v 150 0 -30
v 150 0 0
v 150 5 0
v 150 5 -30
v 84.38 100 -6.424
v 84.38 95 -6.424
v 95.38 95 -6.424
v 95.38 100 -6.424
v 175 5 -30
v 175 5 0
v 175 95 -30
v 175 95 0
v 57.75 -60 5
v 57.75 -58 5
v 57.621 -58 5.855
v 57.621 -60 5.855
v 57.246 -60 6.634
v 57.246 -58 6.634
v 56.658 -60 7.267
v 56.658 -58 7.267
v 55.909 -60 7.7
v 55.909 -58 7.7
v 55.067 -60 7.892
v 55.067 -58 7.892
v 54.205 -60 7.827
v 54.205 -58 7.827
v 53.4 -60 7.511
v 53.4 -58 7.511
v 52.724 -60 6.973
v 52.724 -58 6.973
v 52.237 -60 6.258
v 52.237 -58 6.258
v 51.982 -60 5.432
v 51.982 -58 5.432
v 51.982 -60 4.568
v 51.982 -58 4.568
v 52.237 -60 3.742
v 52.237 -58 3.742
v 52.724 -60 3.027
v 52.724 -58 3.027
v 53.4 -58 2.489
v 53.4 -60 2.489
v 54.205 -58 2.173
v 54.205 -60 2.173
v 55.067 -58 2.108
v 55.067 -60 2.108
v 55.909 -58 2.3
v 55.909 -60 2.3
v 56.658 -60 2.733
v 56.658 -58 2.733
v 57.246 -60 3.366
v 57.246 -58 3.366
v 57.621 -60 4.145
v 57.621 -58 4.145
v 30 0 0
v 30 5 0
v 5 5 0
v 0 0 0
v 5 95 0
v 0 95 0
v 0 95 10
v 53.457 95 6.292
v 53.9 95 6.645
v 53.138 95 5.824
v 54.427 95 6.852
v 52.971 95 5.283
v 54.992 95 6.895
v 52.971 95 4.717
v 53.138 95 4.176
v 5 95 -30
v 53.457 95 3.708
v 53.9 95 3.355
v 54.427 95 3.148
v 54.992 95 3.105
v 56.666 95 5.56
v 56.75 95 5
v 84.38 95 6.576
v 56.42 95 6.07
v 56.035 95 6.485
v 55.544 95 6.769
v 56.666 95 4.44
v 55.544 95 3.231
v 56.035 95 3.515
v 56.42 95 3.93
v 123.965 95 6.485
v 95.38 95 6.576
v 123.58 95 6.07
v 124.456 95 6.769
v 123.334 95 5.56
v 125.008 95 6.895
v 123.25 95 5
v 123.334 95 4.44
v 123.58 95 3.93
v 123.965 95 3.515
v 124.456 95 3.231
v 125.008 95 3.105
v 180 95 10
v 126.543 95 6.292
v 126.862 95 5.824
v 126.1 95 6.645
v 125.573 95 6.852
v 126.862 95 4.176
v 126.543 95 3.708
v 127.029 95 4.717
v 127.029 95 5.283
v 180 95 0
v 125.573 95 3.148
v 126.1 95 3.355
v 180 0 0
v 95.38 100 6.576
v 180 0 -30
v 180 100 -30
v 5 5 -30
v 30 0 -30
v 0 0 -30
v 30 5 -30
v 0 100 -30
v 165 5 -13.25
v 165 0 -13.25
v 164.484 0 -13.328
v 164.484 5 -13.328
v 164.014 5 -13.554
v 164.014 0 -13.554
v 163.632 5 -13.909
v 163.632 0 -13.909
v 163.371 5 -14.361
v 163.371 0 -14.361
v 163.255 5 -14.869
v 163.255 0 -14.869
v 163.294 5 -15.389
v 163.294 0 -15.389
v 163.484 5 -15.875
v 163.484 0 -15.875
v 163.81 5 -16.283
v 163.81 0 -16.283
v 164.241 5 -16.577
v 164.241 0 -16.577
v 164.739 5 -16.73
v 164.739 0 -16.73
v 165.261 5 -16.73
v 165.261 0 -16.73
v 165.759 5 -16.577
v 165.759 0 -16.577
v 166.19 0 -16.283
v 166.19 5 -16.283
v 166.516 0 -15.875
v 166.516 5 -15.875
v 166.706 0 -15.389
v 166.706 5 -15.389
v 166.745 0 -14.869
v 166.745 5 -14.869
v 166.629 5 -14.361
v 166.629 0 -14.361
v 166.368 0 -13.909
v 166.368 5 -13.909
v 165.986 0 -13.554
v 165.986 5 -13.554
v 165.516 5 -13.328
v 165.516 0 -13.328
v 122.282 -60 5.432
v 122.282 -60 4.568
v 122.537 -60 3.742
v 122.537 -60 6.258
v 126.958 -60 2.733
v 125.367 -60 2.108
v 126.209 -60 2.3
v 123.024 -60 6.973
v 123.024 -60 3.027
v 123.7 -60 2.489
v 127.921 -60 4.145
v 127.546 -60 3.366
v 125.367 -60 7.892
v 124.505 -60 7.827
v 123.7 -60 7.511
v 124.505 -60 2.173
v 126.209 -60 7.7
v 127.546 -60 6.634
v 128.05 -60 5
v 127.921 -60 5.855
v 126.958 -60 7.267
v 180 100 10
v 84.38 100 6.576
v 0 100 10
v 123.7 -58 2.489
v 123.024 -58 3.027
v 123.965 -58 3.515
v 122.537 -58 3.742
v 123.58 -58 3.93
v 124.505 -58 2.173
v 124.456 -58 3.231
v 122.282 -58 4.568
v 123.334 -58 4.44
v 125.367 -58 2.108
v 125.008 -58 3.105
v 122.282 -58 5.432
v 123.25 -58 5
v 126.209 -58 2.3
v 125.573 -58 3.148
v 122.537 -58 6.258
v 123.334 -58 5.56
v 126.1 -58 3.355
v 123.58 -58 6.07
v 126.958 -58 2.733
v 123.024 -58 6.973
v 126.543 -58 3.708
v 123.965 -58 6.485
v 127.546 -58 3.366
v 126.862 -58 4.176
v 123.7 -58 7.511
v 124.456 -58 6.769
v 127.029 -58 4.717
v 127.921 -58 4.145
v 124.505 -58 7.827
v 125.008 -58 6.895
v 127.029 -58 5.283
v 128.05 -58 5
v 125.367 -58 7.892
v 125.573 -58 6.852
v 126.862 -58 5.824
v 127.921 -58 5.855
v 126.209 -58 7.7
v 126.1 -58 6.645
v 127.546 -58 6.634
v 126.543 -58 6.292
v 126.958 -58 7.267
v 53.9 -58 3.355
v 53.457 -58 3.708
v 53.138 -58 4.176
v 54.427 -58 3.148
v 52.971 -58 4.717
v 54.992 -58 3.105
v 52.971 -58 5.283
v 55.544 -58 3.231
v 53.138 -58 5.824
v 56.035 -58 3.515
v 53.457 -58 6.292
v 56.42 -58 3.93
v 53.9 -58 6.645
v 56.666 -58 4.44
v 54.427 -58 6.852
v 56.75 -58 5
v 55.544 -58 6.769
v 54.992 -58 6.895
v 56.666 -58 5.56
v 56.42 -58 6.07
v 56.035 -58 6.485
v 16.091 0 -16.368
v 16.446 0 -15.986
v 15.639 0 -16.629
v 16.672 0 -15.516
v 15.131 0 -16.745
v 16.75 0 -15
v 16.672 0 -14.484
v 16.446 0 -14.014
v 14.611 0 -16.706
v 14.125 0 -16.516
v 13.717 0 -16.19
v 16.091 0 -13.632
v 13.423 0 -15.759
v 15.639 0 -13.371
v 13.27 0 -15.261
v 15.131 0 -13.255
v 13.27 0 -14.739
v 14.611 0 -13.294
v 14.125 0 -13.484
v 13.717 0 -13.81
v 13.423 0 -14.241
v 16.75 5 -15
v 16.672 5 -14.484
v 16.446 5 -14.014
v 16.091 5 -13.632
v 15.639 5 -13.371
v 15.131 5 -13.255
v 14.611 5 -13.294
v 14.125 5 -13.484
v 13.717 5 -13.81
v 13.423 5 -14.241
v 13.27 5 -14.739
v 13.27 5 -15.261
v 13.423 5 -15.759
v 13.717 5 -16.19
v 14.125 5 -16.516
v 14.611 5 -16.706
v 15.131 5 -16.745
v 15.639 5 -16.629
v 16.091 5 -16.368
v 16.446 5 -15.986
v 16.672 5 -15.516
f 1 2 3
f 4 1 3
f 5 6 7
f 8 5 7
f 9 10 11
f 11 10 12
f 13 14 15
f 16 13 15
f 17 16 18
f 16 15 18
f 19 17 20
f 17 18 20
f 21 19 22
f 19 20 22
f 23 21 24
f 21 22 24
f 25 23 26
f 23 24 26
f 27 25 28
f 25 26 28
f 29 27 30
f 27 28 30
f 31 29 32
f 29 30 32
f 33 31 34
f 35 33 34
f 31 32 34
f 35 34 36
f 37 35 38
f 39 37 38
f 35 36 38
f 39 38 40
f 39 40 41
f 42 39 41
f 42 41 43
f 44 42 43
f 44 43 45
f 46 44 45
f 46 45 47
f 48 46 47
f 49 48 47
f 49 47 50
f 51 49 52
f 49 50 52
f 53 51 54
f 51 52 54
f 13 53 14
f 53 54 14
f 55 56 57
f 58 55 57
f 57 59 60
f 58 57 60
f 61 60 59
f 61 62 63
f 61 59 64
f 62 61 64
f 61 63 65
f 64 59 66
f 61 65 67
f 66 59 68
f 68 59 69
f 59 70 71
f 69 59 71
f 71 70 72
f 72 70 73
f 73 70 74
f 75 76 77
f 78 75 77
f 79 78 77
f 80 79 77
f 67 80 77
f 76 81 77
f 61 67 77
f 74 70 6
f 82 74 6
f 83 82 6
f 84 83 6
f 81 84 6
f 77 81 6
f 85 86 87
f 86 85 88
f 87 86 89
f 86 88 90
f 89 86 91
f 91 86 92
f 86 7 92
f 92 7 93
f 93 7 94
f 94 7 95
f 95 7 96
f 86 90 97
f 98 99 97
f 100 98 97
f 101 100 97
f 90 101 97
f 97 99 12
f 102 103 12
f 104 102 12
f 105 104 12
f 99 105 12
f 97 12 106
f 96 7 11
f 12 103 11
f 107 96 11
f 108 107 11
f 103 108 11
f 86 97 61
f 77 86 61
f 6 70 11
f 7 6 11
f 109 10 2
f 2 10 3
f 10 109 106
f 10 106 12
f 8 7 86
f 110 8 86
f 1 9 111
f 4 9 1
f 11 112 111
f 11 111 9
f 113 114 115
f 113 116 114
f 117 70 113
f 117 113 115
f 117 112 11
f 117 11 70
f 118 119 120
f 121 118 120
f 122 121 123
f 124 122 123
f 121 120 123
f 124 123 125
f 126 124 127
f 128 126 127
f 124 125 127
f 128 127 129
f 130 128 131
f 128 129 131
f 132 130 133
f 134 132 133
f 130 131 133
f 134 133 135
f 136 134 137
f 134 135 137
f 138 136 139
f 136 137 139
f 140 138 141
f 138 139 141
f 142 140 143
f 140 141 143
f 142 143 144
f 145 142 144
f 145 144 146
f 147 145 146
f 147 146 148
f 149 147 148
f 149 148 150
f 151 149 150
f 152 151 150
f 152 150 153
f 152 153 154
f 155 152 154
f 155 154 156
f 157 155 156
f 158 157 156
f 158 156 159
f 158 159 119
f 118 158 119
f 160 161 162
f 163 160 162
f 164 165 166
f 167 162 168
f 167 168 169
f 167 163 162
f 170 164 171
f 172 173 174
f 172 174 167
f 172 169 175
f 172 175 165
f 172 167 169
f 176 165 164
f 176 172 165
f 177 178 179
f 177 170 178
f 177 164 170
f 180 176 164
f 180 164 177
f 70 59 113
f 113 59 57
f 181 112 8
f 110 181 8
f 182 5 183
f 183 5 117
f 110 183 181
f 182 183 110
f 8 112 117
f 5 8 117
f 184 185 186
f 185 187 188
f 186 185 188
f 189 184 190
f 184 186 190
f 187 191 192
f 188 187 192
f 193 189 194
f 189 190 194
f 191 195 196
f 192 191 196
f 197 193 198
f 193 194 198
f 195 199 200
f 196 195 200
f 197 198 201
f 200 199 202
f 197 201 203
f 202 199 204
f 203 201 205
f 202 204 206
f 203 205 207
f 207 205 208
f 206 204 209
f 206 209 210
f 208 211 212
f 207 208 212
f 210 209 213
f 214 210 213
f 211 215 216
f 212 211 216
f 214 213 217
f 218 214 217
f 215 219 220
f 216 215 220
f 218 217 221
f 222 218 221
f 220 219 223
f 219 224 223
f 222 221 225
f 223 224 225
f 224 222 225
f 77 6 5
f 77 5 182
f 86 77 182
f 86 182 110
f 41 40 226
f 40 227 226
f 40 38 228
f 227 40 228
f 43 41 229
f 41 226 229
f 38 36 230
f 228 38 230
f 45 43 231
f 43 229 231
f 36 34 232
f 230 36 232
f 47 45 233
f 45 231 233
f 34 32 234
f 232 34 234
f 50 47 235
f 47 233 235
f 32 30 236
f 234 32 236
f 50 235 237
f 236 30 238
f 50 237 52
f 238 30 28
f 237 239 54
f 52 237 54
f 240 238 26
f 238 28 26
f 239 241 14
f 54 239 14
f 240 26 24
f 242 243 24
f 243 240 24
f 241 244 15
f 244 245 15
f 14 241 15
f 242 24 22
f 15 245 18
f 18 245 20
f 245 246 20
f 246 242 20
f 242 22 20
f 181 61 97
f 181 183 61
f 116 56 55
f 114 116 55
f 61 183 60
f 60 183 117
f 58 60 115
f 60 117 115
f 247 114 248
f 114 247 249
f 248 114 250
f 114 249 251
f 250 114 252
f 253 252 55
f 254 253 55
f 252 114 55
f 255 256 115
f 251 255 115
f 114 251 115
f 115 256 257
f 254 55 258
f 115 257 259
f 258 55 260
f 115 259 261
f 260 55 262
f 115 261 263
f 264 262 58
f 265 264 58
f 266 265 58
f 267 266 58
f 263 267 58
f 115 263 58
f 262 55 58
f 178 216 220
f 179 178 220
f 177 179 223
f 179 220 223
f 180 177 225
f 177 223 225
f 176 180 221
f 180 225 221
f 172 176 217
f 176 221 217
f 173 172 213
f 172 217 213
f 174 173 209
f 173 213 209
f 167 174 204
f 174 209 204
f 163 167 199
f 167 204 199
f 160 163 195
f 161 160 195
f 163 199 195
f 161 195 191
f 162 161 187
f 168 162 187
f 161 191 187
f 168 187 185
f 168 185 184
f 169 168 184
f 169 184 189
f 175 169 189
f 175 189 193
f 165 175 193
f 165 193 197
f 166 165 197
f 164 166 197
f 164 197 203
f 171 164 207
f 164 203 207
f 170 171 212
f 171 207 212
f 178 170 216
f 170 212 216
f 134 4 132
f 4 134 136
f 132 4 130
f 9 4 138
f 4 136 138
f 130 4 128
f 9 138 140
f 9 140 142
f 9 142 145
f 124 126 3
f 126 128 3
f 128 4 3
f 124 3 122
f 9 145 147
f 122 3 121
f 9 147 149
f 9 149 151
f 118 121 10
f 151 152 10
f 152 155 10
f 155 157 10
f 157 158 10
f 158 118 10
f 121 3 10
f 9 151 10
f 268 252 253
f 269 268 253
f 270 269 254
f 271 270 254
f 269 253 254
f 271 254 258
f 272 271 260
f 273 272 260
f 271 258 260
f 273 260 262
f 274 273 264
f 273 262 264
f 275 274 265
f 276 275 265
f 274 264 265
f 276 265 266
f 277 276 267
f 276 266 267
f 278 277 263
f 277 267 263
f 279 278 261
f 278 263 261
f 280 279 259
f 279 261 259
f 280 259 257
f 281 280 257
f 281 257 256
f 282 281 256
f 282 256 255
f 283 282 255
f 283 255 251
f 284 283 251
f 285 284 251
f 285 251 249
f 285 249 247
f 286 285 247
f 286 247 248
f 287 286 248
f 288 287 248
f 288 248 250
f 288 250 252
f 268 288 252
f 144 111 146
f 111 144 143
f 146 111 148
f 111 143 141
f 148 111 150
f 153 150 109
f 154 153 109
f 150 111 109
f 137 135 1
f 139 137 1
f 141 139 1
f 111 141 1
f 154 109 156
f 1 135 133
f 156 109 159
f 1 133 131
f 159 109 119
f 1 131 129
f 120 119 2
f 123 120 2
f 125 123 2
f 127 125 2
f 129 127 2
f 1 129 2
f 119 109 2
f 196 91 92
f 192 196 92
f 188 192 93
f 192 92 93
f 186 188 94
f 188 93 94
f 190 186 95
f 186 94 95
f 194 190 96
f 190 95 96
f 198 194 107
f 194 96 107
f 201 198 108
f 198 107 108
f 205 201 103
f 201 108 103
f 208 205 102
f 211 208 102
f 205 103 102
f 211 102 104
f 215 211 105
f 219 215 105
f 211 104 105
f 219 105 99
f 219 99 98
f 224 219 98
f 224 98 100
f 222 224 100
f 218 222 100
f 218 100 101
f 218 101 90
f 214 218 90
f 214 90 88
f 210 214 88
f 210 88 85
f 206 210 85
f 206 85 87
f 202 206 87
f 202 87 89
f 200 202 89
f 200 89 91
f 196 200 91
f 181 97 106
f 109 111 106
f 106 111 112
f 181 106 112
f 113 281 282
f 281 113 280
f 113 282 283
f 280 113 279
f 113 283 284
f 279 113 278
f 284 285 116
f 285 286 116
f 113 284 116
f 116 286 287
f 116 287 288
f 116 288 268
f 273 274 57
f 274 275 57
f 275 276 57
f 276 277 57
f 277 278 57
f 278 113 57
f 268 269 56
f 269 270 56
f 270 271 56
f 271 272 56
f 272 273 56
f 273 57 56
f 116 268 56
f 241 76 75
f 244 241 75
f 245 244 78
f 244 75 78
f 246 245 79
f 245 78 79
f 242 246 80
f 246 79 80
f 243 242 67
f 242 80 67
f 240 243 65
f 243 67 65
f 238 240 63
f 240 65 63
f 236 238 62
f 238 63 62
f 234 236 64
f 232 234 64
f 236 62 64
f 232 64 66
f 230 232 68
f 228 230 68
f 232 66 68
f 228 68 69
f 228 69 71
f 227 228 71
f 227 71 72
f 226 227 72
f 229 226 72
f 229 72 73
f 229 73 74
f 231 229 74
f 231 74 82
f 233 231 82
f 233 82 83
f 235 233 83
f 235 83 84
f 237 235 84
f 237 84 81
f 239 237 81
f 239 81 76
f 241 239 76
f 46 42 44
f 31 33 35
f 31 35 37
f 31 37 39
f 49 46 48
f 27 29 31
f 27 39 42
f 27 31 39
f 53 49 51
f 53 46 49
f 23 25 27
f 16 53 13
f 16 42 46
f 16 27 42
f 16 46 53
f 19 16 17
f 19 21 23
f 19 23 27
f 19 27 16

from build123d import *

# Parameters (mm, degrees)
BOSS_EXTRUDE1_DEPTH   = 30
SKETCH2_R             = 1.75
CUT_EXTRUDE1_DEPTH    = 10
SKETCH3_R             = 1.9
BOSS_EXTRUDE2_DEPTH   = 155
BOSS_EXTRUDE2_2_DEPTH = 155
BOSS_EXTRUDE3_DEPTH   = 10
BOSS_EXTRUDE4_START   = -2
SKETCH6_R             = 2.9
SKETCH6_R_2           = 1.9
BOSS_EXTRUDE4_DEPTH   = 2
SKETCH7_W             = 11
SKETCH7_H             = 13
CUT_EXTRUDE2_DEPTH    = 240.426397876


with BuildPart() as part:
    # Sketch1 → Boss-Extrude1 (new body)
    with BuildSketch(Plane.XY):
        Polygon((30, 0), (0, 0), (0, 100), (180, 100), (180, 0), (150, 0), (150, 5), (175, 5), (175, 95), (5, 95), (5, 5), (30, 5), align=None)
    extrude(amount=-BOSS_EXTRUDE1_DEPTH)

    # Sketch2 → Cut-Extrude1 (cut)
    with BuildSketch(Plane.XZ):
        with Locations((15, -15)):
            Circle(SKETCH2_R)
        with Locations(Location((165, -15, 0), (0, 0, 90))):
            Circle(SKETCH2_R)
    extrude(amount=-CUT_EXTRUDE1_DEPTH, mode=Mode.SUBTRACT)



with BuildPart() as body_2:
    # Sketch3 → Boss-Extrude2 (new body)
    with BuildSketch(Plane.XZ.offset(-95)):
        with Locations((54.85, 5)):
            Circle(SKETCH3_R)
    extrude(amount=BOSS_EXTRUDE2_DEPTH)


with BuildPart() as body_3:
    # Sketch3 → Boss-Extrude2 2 (new body)
    with BuildSketch(Plane.XZ.offset(-95)):
        with Locations(Location((125.15, 5, 0), (0, 0, 180))):
            Circle(SKETCH3_R)
    extrude(amount=BOSS_EXTRUDE2_2_DEPTH)


with BuildPart() as part_1:
    add(part.part)

    add(body_2.part)  # Boss-Extrude3 merges body 2

    add(body_3.part)  # Boss-Extrude3 merges body 3
    # Sketch5 → Boss-Extrude3 (add)
    with BuildSketch(Plane.XY):
        Polygon((0, 95), (5, 95), (175, 95), (180, 95), (180, 100), (0, 100), align=None)
    extrude(amount=BOSS_EXTRUDE3_DEPTH)

    # Sketch6 → Boss-Extrude4 (add)
    # profile 1 of 2: a face of its own
    with BuildSketch(Plane.XZ.offset(60).offset(BOSS_EXTRUDE4_START)):
        with Locations((54.85, 5)):
            Circle(SKETCH6_R)
        with Locations((54.85, 5)):
            Circle(SKETCH6_R_2, mode=Mode.SUBTRACT)
    # profile 2 of 2: a face of its own
    with BuildSketch(Plane.XZ.offset(60).offset(BOSS_EXTRUDE4_START)):
        with Locations((125.15, 5)):
            Circle(SKETCH6_R)
        with Locations(Location((125.15, 5, 0), (0, 0, 180))):
            Circle(SKETCH6_R_2, mode=Mode.SUBTRACT)
    extrude(amount=BOSS_EXTRUDE4_DEPTH)

    # Sketch7 → Cut-Extrude2 (cut, through all)
    with BuildSketch(Plane.XZ.offset(-95)):
        with Locations((89.880118622, 0.075917746)):
            Rectangle(SKETCH7_W, SKETCH7_H)
    extrude(amount=-CUT_EXTRUDE2_DEPTH, mode=Mode.SUBTRACT)


solid = part_1.part
